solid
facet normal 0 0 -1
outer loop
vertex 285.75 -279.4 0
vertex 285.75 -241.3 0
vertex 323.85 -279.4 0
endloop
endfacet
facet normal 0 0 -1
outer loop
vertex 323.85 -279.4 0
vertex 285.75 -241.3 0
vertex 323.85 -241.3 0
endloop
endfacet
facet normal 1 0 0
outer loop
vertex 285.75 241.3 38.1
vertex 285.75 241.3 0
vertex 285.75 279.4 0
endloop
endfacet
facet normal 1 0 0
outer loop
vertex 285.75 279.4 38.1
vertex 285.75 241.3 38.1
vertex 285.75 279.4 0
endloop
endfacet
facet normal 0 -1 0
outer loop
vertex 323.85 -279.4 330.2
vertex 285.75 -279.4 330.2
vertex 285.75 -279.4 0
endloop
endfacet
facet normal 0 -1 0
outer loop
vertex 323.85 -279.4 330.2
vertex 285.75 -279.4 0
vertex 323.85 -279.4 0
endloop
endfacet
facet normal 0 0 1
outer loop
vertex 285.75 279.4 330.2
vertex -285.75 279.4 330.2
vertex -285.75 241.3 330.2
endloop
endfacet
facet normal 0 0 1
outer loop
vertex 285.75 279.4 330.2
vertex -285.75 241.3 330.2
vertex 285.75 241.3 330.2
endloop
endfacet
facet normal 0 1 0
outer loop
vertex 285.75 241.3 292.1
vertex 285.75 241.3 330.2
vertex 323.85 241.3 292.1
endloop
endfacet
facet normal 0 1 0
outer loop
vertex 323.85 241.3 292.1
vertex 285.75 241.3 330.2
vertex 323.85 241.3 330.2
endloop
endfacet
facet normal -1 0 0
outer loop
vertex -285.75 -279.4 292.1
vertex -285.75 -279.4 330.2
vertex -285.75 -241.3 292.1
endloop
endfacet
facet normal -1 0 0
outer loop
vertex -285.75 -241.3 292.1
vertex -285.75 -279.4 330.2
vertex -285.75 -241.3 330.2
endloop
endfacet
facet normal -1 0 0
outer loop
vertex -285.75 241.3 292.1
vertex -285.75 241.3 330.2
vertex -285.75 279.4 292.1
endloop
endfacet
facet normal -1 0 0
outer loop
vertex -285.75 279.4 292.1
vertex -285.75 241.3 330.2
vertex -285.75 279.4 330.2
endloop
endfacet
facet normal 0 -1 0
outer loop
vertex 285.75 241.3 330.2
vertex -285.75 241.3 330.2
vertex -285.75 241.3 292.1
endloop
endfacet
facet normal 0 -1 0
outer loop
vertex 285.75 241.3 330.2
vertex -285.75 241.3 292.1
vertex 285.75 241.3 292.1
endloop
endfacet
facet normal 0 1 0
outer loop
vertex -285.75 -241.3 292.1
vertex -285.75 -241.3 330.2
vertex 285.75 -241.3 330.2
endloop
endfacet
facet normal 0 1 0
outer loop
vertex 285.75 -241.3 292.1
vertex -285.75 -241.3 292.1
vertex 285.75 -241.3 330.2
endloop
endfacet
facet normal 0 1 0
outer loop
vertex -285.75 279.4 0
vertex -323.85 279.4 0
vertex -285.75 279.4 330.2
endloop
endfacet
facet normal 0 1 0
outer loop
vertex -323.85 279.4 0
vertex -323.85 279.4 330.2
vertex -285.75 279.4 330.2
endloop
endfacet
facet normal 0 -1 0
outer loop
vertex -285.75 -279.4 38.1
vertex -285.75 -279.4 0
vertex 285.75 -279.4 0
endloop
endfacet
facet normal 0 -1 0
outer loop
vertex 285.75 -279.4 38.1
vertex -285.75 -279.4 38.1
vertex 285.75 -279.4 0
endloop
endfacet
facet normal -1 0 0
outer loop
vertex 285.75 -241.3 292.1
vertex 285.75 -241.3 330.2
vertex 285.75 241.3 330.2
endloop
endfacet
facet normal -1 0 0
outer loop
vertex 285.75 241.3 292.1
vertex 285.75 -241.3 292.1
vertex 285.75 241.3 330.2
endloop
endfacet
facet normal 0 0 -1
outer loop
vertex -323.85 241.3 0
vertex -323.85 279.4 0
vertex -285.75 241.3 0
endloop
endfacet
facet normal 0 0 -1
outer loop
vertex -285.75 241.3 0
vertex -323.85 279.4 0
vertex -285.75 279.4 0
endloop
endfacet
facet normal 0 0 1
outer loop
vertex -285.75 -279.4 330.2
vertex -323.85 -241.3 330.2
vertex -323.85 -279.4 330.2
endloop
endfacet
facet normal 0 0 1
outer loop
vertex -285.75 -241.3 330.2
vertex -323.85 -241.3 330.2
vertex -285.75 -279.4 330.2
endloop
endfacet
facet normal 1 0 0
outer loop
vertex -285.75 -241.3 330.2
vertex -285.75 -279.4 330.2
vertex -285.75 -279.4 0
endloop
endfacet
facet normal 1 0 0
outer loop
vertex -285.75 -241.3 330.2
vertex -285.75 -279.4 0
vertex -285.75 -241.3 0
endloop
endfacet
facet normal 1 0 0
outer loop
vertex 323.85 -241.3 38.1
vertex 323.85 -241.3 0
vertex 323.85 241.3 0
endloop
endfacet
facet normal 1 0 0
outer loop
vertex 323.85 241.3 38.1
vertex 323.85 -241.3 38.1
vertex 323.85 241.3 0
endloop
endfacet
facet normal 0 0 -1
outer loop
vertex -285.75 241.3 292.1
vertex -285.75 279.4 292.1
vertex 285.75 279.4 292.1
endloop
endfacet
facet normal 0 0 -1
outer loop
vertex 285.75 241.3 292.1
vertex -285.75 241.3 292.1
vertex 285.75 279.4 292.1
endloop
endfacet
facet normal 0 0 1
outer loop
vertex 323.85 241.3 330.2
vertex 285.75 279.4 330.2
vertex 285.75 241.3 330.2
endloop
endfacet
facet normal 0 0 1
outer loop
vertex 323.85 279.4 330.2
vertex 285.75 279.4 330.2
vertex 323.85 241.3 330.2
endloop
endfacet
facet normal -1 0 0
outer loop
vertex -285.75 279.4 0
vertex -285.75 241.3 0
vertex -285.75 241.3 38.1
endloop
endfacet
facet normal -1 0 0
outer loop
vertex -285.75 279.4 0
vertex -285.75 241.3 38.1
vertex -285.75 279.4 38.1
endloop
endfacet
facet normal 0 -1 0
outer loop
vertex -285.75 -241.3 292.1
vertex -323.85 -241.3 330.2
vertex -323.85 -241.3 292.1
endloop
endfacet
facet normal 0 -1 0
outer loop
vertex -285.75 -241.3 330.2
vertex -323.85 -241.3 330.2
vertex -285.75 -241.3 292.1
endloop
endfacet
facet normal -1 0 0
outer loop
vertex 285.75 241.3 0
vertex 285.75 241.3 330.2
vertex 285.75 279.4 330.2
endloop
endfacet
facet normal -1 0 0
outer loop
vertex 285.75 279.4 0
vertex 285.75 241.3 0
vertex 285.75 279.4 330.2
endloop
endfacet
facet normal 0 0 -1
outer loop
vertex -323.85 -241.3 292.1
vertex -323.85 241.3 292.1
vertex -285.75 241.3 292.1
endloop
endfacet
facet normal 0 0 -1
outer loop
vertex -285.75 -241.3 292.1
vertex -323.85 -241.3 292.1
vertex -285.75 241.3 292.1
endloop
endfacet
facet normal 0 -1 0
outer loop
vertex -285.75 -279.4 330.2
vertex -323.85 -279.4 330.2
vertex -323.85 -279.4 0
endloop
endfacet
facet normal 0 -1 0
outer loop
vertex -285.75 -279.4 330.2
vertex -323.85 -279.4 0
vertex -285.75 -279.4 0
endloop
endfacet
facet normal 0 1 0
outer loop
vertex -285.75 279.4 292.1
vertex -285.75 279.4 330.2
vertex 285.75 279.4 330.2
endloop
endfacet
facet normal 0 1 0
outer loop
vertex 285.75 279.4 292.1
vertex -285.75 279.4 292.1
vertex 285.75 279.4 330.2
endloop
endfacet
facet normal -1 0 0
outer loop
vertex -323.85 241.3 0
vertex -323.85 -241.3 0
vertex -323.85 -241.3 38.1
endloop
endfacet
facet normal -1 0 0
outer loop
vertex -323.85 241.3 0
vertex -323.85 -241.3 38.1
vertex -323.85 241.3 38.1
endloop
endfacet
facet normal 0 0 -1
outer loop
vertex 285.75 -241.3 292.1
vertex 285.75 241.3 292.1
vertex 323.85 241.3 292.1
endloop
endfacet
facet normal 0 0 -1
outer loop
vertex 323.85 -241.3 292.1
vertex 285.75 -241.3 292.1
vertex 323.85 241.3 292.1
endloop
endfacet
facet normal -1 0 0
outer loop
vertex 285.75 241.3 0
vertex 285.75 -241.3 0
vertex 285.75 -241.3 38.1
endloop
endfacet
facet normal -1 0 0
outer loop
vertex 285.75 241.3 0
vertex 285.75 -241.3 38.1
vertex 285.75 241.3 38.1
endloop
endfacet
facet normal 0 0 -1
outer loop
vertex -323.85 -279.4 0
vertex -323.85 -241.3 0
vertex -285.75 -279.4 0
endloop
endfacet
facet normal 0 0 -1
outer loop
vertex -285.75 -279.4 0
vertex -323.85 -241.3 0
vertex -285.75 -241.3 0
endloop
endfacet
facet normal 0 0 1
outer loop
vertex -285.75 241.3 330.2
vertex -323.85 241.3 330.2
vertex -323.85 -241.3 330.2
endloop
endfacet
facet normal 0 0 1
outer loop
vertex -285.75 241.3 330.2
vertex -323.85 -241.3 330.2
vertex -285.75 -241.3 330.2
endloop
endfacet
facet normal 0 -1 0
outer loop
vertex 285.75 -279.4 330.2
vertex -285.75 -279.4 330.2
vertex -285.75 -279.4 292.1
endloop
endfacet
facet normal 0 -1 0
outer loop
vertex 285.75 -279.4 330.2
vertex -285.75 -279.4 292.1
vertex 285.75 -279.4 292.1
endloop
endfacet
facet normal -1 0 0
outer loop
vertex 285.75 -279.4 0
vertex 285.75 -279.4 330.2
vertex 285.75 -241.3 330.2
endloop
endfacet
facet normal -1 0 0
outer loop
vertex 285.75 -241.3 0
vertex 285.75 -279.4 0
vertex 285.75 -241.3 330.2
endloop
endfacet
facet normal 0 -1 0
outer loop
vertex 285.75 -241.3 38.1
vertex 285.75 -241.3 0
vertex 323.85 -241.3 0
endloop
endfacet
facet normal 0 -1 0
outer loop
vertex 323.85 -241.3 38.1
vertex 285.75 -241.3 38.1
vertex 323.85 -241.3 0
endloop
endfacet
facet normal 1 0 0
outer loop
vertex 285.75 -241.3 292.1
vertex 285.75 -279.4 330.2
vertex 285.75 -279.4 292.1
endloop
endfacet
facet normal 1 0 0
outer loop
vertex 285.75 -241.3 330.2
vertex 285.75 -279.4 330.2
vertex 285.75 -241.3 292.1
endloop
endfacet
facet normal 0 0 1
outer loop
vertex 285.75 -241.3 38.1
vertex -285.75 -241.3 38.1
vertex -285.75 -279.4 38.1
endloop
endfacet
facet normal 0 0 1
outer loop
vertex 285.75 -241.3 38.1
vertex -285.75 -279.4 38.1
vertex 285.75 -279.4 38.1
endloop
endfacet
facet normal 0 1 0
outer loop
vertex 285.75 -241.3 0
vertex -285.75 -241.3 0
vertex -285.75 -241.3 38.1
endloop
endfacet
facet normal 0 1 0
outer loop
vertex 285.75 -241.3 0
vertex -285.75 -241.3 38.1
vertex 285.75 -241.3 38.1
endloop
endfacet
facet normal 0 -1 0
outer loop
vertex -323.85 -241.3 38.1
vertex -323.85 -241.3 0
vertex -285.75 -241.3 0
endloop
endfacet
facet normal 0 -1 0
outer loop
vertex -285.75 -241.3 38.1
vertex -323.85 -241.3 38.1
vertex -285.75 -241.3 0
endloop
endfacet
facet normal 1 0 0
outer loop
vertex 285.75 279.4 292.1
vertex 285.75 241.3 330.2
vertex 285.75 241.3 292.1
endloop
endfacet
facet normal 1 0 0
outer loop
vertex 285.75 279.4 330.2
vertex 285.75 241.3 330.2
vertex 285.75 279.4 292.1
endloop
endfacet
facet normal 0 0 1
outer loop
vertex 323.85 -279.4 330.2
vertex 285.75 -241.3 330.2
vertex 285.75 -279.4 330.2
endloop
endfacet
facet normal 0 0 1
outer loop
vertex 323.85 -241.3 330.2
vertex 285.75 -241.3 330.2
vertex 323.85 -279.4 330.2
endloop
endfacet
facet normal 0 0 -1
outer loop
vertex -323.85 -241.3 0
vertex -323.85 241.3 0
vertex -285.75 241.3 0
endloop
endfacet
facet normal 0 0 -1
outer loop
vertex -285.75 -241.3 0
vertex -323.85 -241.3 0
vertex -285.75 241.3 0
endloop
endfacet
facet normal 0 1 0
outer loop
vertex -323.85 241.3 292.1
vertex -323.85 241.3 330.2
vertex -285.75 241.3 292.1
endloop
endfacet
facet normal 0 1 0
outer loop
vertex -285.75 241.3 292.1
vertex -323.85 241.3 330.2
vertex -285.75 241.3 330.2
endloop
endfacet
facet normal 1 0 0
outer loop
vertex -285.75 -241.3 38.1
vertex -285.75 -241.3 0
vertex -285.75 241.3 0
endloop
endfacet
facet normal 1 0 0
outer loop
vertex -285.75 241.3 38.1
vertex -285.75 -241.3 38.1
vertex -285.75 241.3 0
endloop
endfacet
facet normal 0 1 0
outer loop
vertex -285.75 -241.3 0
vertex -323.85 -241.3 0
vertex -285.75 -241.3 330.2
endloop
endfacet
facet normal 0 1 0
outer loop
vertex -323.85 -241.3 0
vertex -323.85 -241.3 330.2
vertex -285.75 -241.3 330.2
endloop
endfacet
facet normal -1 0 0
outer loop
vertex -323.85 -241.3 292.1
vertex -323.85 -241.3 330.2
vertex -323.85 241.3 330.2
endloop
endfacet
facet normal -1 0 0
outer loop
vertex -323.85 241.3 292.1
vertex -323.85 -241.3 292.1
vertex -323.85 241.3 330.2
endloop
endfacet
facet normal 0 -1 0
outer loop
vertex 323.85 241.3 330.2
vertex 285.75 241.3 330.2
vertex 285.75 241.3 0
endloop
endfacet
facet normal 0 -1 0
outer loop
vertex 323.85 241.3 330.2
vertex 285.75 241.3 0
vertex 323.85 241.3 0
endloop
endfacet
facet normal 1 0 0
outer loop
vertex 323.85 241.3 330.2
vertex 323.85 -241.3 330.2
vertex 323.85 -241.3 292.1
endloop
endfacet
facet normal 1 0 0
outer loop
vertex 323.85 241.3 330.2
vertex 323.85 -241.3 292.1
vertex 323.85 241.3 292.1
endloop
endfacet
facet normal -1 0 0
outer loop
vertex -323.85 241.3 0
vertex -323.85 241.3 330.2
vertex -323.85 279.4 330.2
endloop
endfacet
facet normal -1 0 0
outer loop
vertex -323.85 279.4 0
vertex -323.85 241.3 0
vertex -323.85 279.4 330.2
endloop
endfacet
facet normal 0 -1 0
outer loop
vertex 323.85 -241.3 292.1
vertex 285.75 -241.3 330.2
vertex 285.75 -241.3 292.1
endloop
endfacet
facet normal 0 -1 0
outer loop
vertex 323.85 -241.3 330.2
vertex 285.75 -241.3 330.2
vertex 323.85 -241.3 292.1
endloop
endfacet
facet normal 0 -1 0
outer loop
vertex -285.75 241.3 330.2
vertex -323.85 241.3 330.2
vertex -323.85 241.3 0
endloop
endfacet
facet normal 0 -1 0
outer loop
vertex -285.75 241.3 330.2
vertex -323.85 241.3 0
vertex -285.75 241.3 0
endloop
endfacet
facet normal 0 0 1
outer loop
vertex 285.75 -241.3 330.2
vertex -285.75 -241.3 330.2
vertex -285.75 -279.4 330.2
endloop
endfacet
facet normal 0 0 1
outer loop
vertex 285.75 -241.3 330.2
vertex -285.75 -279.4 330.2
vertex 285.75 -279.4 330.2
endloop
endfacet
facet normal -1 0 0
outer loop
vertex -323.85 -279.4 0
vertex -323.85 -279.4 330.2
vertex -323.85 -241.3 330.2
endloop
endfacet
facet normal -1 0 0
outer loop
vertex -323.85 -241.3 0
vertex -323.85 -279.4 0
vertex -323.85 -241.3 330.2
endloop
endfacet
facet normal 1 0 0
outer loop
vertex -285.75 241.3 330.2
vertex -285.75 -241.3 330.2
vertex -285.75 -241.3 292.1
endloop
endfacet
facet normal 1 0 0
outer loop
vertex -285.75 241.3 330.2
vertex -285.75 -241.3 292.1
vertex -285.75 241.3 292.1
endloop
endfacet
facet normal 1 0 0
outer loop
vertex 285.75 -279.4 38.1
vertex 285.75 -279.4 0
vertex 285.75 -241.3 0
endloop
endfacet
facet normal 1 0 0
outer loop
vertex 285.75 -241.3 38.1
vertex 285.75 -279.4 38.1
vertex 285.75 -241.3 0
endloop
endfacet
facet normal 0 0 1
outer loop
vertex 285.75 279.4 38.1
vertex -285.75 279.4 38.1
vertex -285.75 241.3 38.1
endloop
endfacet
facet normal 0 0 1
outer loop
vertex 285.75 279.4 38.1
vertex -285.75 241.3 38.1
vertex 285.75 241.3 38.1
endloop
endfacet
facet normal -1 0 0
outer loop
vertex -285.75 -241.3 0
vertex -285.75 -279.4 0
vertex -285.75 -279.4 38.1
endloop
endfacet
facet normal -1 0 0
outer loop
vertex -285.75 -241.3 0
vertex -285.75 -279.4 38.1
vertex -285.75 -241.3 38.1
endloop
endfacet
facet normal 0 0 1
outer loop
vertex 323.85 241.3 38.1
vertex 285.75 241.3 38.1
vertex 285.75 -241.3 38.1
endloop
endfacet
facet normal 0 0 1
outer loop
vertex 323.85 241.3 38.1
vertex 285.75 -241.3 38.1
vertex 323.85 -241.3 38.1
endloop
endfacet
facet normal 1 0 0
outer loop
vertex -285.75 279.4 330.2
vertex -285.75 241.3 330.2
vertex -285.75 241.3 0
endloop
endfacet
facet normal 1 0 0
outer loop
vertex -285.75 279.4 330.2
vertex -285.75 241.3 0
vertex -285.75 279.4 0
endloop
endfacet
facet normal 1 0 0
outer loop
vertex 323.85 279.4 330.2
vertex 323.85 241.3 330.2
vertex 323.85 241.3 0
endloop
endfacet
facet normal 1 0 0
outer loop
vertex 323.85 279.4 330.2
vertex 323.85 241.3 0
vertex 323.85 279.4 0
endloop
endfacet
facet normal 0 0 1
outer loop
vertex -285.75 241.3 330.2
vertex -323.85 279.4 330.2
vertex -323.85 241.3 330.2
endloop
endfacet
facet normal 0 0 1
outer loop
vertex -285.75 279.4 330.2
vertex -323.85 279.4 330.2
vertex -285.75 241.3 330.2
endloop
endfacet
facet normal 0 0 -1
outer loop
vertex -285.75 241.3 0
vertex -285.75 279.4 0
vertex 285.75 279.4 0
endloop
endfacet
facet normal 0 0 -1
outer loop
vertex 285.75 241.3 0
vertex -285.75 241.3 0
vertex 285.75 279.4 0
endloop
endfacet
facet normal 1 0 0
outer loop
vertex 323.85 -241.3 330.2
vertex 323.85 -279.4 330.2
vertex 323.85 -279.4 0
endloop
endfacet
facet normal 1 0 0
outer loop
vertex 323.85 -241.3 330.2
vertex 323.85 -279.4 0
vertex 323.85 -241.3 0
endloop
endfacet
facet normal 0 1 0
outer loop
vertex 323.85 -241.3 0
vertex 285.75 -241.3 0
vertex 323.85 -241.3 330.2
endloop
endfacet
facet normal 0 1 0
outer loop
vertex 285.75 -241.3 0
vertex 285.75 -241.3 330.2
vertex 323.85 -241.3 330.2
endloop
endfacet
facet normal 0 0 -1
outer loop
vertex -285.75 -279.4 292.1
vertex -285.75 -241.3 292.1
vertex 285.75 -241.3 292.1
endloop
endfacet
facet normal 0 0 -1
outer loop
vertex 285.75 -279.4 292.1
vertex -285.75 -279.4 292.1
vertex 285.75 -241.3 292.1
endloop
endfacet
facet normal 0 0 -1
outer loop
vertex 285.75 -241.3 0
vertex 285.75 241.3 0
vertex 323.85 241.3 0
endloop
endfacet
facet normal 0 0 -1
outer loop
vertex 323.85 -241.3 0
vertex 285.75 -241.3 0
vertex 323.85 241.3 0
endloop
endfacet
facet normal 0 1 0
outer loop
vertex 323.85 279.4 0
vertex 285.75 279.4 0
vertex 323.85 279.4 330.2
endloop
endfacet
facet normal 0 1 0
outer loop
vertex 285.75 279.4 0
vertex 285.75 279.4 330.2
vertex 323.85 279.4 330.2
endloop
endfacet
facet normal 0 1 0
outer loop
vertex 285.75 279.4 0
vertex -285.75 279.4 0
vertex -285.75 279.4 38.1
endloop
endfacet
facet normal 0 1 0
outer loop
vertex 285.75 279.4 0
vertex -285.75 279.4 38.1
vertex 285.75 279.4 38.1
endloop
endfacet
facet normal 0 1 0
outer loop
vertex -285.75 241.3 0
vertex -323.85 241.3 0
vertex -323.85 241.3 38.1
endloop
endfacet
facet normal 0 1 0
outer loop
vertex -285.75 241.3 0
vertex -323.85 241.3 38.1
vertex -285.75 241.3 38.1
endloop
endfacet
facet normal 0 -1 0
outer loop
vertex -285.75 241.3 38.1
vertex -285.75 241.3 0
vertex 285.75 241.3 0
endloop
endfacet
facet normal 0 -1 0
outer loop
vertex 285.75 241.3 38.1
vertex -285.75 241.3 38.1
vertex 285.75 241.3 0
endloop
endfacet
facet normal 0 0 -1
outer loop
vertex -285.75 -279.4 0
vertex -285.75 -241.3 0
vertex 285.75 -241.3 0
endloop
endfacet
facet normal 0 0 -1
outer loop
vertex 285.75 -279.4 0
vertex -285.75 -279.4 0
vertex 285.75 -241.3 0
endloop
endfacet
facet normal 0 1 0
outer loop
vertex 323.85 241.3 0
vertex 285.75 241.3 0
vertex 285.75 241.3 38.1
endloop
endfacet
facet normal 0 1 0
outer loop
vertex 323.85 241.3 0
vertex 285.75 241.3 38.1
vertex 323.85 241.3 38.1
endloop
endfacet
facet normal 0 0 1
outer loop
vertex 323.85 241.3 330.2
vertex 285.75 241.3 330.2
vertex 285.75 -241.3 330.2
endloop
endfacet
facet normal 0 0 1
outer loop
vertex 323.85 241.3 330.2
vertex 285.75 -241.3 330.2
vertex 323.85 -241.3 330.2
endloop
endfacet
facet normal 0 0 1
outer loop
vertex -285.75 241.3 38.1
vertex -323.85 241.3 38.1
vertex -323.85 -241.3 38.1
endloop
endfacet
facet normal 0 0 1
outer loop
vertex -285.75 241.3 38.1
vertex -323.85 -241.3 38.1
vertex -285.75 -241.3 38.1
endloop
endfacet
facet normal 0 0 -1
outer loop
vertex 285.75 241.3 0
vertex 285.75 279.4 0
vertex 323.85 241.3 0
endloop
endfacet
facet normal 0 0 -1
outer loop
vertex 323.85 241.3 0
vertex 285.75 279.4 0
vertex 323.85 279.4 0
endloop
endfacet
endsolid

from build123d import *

# Parameters (mm, degrees)
F0_W     = 571.5
F0_H     = 38.1
F1_DEPTH = 38.1
F0_W_2   = 38.1
F0_H_2   = 482.6
F3_W     = 38.1
F3_H     = 38.1
F4_DEPTH = 165.1


# Not quite as in the source:
# - a pattern or mirror of a feature is missing from the dataset's text; its kind, count and spacing are read off the source's solid


with BuildPart() as f1:
    # F0 (on Top) → F1 (new body)
    with BuildSketch(Plane.XY):
        with Locations((0, 260.35)):
            Rectangle(F0_W, F0_H)
    extrude(amount=F1_DEPTH)


with BuildPart() as f1b:
    # F0 (on Top) → F1, piece 2 (new body)
    with BuildSketch(Plane.XY):
        with Locations((-304.8, 0)):
            Rectangle(F0_W_2, F0_H_2)
    extrude(amount=F1_DEPTH)


with BuildPart() as f1c:
    # F0 (on Top) → F1, piece 3 (new body)
    with BuildSketch(Plane.XY):
        with Locations((304.8, 0)):
            Rectangle(F0_W_2, F0_H_2)
    extrude(amount=F1_DEPTH)


with BuildPart() as f1d:
    # F0 (on Top) → F1, piece 4 (new body)
    with BuildSketch(Plane.XY):
        with Locations((0, -260.35)):
            Rectangle(F0_W, F0_H)
    extrude(amount=F1_DEPTH)


with BuildPart() as f1_copies_1:
    # F1_copies: instance of F1
    add(f1.part.mirror(Plane.XY.offset(165.1)))


with BuildPart() as f1_2_copies_1:
    # F1_2_copies: instance of F1b
    add(f1b.part.mirror(Plane.XY.offset(165.1)))


with BuildPart() as f1_3_copies_1:
    # F1_3_copies: instance of F1c
    add(f1c.part.mirror(Plane.XY.offset(165.1)))


with BuildPart() as f1_4_copies_1:
    # F1_4_copies: instance of F1d
    add(f1d.part.mirror(Plane.XY.offset(165.1)))


with BuildPart() as f4:
    # F3 (on offset) → F4 (new body, symmetric)
    with BuildSketch(Plane.XY.offset(165.1)):
        with Locations((-304.8, -260.35)):
            Rectangle(F3_W, F3_H)
    extrude(amount=F4_DEPTH, both=True)


with BuildPart() as f4b:
    # F3 (on offset) → F4, piece 2 (new body, symmetric)
    with BuildSketch(Plane.XY.offset(165.1)):
        with Locations((304.8, -260.35)):
            Rectangle(F3_W, F3_H)
    extrude(amount=F4_DEPTH, both=True)


with BuildPart() as f4c:
    # F3 (on offset) → F4, piece 3 (new body, symmetric)
    with BuildSketch(Plane.XY.offset(165.1)):
        with Locations((304.8, 260.35)):
            Rectangle(F3_W, F3_H)
    extrude(amount=F4_DEPTH, both=True)


with BuildPart() as f4d:
    # F3 (on offset) → F4, piece 4 (new body, symmetric)
    with BuildSketch(Plane.XY.offset(165.1)):
        with Locations((-304.8, 260.35)):
            Rectangle(F3_W, F3_H)
    extrude(amount=F4_DEPTH, both=True)


solid = Compound([f1.part, f1b.part, f1c.part, f1d.part, f1_copies_1.part, f1_2_copies_1.part, f1_3_copies_1.part, f1_4_copies_1.part, f4.part, f4b.part, f4c.part, f4d.part])
